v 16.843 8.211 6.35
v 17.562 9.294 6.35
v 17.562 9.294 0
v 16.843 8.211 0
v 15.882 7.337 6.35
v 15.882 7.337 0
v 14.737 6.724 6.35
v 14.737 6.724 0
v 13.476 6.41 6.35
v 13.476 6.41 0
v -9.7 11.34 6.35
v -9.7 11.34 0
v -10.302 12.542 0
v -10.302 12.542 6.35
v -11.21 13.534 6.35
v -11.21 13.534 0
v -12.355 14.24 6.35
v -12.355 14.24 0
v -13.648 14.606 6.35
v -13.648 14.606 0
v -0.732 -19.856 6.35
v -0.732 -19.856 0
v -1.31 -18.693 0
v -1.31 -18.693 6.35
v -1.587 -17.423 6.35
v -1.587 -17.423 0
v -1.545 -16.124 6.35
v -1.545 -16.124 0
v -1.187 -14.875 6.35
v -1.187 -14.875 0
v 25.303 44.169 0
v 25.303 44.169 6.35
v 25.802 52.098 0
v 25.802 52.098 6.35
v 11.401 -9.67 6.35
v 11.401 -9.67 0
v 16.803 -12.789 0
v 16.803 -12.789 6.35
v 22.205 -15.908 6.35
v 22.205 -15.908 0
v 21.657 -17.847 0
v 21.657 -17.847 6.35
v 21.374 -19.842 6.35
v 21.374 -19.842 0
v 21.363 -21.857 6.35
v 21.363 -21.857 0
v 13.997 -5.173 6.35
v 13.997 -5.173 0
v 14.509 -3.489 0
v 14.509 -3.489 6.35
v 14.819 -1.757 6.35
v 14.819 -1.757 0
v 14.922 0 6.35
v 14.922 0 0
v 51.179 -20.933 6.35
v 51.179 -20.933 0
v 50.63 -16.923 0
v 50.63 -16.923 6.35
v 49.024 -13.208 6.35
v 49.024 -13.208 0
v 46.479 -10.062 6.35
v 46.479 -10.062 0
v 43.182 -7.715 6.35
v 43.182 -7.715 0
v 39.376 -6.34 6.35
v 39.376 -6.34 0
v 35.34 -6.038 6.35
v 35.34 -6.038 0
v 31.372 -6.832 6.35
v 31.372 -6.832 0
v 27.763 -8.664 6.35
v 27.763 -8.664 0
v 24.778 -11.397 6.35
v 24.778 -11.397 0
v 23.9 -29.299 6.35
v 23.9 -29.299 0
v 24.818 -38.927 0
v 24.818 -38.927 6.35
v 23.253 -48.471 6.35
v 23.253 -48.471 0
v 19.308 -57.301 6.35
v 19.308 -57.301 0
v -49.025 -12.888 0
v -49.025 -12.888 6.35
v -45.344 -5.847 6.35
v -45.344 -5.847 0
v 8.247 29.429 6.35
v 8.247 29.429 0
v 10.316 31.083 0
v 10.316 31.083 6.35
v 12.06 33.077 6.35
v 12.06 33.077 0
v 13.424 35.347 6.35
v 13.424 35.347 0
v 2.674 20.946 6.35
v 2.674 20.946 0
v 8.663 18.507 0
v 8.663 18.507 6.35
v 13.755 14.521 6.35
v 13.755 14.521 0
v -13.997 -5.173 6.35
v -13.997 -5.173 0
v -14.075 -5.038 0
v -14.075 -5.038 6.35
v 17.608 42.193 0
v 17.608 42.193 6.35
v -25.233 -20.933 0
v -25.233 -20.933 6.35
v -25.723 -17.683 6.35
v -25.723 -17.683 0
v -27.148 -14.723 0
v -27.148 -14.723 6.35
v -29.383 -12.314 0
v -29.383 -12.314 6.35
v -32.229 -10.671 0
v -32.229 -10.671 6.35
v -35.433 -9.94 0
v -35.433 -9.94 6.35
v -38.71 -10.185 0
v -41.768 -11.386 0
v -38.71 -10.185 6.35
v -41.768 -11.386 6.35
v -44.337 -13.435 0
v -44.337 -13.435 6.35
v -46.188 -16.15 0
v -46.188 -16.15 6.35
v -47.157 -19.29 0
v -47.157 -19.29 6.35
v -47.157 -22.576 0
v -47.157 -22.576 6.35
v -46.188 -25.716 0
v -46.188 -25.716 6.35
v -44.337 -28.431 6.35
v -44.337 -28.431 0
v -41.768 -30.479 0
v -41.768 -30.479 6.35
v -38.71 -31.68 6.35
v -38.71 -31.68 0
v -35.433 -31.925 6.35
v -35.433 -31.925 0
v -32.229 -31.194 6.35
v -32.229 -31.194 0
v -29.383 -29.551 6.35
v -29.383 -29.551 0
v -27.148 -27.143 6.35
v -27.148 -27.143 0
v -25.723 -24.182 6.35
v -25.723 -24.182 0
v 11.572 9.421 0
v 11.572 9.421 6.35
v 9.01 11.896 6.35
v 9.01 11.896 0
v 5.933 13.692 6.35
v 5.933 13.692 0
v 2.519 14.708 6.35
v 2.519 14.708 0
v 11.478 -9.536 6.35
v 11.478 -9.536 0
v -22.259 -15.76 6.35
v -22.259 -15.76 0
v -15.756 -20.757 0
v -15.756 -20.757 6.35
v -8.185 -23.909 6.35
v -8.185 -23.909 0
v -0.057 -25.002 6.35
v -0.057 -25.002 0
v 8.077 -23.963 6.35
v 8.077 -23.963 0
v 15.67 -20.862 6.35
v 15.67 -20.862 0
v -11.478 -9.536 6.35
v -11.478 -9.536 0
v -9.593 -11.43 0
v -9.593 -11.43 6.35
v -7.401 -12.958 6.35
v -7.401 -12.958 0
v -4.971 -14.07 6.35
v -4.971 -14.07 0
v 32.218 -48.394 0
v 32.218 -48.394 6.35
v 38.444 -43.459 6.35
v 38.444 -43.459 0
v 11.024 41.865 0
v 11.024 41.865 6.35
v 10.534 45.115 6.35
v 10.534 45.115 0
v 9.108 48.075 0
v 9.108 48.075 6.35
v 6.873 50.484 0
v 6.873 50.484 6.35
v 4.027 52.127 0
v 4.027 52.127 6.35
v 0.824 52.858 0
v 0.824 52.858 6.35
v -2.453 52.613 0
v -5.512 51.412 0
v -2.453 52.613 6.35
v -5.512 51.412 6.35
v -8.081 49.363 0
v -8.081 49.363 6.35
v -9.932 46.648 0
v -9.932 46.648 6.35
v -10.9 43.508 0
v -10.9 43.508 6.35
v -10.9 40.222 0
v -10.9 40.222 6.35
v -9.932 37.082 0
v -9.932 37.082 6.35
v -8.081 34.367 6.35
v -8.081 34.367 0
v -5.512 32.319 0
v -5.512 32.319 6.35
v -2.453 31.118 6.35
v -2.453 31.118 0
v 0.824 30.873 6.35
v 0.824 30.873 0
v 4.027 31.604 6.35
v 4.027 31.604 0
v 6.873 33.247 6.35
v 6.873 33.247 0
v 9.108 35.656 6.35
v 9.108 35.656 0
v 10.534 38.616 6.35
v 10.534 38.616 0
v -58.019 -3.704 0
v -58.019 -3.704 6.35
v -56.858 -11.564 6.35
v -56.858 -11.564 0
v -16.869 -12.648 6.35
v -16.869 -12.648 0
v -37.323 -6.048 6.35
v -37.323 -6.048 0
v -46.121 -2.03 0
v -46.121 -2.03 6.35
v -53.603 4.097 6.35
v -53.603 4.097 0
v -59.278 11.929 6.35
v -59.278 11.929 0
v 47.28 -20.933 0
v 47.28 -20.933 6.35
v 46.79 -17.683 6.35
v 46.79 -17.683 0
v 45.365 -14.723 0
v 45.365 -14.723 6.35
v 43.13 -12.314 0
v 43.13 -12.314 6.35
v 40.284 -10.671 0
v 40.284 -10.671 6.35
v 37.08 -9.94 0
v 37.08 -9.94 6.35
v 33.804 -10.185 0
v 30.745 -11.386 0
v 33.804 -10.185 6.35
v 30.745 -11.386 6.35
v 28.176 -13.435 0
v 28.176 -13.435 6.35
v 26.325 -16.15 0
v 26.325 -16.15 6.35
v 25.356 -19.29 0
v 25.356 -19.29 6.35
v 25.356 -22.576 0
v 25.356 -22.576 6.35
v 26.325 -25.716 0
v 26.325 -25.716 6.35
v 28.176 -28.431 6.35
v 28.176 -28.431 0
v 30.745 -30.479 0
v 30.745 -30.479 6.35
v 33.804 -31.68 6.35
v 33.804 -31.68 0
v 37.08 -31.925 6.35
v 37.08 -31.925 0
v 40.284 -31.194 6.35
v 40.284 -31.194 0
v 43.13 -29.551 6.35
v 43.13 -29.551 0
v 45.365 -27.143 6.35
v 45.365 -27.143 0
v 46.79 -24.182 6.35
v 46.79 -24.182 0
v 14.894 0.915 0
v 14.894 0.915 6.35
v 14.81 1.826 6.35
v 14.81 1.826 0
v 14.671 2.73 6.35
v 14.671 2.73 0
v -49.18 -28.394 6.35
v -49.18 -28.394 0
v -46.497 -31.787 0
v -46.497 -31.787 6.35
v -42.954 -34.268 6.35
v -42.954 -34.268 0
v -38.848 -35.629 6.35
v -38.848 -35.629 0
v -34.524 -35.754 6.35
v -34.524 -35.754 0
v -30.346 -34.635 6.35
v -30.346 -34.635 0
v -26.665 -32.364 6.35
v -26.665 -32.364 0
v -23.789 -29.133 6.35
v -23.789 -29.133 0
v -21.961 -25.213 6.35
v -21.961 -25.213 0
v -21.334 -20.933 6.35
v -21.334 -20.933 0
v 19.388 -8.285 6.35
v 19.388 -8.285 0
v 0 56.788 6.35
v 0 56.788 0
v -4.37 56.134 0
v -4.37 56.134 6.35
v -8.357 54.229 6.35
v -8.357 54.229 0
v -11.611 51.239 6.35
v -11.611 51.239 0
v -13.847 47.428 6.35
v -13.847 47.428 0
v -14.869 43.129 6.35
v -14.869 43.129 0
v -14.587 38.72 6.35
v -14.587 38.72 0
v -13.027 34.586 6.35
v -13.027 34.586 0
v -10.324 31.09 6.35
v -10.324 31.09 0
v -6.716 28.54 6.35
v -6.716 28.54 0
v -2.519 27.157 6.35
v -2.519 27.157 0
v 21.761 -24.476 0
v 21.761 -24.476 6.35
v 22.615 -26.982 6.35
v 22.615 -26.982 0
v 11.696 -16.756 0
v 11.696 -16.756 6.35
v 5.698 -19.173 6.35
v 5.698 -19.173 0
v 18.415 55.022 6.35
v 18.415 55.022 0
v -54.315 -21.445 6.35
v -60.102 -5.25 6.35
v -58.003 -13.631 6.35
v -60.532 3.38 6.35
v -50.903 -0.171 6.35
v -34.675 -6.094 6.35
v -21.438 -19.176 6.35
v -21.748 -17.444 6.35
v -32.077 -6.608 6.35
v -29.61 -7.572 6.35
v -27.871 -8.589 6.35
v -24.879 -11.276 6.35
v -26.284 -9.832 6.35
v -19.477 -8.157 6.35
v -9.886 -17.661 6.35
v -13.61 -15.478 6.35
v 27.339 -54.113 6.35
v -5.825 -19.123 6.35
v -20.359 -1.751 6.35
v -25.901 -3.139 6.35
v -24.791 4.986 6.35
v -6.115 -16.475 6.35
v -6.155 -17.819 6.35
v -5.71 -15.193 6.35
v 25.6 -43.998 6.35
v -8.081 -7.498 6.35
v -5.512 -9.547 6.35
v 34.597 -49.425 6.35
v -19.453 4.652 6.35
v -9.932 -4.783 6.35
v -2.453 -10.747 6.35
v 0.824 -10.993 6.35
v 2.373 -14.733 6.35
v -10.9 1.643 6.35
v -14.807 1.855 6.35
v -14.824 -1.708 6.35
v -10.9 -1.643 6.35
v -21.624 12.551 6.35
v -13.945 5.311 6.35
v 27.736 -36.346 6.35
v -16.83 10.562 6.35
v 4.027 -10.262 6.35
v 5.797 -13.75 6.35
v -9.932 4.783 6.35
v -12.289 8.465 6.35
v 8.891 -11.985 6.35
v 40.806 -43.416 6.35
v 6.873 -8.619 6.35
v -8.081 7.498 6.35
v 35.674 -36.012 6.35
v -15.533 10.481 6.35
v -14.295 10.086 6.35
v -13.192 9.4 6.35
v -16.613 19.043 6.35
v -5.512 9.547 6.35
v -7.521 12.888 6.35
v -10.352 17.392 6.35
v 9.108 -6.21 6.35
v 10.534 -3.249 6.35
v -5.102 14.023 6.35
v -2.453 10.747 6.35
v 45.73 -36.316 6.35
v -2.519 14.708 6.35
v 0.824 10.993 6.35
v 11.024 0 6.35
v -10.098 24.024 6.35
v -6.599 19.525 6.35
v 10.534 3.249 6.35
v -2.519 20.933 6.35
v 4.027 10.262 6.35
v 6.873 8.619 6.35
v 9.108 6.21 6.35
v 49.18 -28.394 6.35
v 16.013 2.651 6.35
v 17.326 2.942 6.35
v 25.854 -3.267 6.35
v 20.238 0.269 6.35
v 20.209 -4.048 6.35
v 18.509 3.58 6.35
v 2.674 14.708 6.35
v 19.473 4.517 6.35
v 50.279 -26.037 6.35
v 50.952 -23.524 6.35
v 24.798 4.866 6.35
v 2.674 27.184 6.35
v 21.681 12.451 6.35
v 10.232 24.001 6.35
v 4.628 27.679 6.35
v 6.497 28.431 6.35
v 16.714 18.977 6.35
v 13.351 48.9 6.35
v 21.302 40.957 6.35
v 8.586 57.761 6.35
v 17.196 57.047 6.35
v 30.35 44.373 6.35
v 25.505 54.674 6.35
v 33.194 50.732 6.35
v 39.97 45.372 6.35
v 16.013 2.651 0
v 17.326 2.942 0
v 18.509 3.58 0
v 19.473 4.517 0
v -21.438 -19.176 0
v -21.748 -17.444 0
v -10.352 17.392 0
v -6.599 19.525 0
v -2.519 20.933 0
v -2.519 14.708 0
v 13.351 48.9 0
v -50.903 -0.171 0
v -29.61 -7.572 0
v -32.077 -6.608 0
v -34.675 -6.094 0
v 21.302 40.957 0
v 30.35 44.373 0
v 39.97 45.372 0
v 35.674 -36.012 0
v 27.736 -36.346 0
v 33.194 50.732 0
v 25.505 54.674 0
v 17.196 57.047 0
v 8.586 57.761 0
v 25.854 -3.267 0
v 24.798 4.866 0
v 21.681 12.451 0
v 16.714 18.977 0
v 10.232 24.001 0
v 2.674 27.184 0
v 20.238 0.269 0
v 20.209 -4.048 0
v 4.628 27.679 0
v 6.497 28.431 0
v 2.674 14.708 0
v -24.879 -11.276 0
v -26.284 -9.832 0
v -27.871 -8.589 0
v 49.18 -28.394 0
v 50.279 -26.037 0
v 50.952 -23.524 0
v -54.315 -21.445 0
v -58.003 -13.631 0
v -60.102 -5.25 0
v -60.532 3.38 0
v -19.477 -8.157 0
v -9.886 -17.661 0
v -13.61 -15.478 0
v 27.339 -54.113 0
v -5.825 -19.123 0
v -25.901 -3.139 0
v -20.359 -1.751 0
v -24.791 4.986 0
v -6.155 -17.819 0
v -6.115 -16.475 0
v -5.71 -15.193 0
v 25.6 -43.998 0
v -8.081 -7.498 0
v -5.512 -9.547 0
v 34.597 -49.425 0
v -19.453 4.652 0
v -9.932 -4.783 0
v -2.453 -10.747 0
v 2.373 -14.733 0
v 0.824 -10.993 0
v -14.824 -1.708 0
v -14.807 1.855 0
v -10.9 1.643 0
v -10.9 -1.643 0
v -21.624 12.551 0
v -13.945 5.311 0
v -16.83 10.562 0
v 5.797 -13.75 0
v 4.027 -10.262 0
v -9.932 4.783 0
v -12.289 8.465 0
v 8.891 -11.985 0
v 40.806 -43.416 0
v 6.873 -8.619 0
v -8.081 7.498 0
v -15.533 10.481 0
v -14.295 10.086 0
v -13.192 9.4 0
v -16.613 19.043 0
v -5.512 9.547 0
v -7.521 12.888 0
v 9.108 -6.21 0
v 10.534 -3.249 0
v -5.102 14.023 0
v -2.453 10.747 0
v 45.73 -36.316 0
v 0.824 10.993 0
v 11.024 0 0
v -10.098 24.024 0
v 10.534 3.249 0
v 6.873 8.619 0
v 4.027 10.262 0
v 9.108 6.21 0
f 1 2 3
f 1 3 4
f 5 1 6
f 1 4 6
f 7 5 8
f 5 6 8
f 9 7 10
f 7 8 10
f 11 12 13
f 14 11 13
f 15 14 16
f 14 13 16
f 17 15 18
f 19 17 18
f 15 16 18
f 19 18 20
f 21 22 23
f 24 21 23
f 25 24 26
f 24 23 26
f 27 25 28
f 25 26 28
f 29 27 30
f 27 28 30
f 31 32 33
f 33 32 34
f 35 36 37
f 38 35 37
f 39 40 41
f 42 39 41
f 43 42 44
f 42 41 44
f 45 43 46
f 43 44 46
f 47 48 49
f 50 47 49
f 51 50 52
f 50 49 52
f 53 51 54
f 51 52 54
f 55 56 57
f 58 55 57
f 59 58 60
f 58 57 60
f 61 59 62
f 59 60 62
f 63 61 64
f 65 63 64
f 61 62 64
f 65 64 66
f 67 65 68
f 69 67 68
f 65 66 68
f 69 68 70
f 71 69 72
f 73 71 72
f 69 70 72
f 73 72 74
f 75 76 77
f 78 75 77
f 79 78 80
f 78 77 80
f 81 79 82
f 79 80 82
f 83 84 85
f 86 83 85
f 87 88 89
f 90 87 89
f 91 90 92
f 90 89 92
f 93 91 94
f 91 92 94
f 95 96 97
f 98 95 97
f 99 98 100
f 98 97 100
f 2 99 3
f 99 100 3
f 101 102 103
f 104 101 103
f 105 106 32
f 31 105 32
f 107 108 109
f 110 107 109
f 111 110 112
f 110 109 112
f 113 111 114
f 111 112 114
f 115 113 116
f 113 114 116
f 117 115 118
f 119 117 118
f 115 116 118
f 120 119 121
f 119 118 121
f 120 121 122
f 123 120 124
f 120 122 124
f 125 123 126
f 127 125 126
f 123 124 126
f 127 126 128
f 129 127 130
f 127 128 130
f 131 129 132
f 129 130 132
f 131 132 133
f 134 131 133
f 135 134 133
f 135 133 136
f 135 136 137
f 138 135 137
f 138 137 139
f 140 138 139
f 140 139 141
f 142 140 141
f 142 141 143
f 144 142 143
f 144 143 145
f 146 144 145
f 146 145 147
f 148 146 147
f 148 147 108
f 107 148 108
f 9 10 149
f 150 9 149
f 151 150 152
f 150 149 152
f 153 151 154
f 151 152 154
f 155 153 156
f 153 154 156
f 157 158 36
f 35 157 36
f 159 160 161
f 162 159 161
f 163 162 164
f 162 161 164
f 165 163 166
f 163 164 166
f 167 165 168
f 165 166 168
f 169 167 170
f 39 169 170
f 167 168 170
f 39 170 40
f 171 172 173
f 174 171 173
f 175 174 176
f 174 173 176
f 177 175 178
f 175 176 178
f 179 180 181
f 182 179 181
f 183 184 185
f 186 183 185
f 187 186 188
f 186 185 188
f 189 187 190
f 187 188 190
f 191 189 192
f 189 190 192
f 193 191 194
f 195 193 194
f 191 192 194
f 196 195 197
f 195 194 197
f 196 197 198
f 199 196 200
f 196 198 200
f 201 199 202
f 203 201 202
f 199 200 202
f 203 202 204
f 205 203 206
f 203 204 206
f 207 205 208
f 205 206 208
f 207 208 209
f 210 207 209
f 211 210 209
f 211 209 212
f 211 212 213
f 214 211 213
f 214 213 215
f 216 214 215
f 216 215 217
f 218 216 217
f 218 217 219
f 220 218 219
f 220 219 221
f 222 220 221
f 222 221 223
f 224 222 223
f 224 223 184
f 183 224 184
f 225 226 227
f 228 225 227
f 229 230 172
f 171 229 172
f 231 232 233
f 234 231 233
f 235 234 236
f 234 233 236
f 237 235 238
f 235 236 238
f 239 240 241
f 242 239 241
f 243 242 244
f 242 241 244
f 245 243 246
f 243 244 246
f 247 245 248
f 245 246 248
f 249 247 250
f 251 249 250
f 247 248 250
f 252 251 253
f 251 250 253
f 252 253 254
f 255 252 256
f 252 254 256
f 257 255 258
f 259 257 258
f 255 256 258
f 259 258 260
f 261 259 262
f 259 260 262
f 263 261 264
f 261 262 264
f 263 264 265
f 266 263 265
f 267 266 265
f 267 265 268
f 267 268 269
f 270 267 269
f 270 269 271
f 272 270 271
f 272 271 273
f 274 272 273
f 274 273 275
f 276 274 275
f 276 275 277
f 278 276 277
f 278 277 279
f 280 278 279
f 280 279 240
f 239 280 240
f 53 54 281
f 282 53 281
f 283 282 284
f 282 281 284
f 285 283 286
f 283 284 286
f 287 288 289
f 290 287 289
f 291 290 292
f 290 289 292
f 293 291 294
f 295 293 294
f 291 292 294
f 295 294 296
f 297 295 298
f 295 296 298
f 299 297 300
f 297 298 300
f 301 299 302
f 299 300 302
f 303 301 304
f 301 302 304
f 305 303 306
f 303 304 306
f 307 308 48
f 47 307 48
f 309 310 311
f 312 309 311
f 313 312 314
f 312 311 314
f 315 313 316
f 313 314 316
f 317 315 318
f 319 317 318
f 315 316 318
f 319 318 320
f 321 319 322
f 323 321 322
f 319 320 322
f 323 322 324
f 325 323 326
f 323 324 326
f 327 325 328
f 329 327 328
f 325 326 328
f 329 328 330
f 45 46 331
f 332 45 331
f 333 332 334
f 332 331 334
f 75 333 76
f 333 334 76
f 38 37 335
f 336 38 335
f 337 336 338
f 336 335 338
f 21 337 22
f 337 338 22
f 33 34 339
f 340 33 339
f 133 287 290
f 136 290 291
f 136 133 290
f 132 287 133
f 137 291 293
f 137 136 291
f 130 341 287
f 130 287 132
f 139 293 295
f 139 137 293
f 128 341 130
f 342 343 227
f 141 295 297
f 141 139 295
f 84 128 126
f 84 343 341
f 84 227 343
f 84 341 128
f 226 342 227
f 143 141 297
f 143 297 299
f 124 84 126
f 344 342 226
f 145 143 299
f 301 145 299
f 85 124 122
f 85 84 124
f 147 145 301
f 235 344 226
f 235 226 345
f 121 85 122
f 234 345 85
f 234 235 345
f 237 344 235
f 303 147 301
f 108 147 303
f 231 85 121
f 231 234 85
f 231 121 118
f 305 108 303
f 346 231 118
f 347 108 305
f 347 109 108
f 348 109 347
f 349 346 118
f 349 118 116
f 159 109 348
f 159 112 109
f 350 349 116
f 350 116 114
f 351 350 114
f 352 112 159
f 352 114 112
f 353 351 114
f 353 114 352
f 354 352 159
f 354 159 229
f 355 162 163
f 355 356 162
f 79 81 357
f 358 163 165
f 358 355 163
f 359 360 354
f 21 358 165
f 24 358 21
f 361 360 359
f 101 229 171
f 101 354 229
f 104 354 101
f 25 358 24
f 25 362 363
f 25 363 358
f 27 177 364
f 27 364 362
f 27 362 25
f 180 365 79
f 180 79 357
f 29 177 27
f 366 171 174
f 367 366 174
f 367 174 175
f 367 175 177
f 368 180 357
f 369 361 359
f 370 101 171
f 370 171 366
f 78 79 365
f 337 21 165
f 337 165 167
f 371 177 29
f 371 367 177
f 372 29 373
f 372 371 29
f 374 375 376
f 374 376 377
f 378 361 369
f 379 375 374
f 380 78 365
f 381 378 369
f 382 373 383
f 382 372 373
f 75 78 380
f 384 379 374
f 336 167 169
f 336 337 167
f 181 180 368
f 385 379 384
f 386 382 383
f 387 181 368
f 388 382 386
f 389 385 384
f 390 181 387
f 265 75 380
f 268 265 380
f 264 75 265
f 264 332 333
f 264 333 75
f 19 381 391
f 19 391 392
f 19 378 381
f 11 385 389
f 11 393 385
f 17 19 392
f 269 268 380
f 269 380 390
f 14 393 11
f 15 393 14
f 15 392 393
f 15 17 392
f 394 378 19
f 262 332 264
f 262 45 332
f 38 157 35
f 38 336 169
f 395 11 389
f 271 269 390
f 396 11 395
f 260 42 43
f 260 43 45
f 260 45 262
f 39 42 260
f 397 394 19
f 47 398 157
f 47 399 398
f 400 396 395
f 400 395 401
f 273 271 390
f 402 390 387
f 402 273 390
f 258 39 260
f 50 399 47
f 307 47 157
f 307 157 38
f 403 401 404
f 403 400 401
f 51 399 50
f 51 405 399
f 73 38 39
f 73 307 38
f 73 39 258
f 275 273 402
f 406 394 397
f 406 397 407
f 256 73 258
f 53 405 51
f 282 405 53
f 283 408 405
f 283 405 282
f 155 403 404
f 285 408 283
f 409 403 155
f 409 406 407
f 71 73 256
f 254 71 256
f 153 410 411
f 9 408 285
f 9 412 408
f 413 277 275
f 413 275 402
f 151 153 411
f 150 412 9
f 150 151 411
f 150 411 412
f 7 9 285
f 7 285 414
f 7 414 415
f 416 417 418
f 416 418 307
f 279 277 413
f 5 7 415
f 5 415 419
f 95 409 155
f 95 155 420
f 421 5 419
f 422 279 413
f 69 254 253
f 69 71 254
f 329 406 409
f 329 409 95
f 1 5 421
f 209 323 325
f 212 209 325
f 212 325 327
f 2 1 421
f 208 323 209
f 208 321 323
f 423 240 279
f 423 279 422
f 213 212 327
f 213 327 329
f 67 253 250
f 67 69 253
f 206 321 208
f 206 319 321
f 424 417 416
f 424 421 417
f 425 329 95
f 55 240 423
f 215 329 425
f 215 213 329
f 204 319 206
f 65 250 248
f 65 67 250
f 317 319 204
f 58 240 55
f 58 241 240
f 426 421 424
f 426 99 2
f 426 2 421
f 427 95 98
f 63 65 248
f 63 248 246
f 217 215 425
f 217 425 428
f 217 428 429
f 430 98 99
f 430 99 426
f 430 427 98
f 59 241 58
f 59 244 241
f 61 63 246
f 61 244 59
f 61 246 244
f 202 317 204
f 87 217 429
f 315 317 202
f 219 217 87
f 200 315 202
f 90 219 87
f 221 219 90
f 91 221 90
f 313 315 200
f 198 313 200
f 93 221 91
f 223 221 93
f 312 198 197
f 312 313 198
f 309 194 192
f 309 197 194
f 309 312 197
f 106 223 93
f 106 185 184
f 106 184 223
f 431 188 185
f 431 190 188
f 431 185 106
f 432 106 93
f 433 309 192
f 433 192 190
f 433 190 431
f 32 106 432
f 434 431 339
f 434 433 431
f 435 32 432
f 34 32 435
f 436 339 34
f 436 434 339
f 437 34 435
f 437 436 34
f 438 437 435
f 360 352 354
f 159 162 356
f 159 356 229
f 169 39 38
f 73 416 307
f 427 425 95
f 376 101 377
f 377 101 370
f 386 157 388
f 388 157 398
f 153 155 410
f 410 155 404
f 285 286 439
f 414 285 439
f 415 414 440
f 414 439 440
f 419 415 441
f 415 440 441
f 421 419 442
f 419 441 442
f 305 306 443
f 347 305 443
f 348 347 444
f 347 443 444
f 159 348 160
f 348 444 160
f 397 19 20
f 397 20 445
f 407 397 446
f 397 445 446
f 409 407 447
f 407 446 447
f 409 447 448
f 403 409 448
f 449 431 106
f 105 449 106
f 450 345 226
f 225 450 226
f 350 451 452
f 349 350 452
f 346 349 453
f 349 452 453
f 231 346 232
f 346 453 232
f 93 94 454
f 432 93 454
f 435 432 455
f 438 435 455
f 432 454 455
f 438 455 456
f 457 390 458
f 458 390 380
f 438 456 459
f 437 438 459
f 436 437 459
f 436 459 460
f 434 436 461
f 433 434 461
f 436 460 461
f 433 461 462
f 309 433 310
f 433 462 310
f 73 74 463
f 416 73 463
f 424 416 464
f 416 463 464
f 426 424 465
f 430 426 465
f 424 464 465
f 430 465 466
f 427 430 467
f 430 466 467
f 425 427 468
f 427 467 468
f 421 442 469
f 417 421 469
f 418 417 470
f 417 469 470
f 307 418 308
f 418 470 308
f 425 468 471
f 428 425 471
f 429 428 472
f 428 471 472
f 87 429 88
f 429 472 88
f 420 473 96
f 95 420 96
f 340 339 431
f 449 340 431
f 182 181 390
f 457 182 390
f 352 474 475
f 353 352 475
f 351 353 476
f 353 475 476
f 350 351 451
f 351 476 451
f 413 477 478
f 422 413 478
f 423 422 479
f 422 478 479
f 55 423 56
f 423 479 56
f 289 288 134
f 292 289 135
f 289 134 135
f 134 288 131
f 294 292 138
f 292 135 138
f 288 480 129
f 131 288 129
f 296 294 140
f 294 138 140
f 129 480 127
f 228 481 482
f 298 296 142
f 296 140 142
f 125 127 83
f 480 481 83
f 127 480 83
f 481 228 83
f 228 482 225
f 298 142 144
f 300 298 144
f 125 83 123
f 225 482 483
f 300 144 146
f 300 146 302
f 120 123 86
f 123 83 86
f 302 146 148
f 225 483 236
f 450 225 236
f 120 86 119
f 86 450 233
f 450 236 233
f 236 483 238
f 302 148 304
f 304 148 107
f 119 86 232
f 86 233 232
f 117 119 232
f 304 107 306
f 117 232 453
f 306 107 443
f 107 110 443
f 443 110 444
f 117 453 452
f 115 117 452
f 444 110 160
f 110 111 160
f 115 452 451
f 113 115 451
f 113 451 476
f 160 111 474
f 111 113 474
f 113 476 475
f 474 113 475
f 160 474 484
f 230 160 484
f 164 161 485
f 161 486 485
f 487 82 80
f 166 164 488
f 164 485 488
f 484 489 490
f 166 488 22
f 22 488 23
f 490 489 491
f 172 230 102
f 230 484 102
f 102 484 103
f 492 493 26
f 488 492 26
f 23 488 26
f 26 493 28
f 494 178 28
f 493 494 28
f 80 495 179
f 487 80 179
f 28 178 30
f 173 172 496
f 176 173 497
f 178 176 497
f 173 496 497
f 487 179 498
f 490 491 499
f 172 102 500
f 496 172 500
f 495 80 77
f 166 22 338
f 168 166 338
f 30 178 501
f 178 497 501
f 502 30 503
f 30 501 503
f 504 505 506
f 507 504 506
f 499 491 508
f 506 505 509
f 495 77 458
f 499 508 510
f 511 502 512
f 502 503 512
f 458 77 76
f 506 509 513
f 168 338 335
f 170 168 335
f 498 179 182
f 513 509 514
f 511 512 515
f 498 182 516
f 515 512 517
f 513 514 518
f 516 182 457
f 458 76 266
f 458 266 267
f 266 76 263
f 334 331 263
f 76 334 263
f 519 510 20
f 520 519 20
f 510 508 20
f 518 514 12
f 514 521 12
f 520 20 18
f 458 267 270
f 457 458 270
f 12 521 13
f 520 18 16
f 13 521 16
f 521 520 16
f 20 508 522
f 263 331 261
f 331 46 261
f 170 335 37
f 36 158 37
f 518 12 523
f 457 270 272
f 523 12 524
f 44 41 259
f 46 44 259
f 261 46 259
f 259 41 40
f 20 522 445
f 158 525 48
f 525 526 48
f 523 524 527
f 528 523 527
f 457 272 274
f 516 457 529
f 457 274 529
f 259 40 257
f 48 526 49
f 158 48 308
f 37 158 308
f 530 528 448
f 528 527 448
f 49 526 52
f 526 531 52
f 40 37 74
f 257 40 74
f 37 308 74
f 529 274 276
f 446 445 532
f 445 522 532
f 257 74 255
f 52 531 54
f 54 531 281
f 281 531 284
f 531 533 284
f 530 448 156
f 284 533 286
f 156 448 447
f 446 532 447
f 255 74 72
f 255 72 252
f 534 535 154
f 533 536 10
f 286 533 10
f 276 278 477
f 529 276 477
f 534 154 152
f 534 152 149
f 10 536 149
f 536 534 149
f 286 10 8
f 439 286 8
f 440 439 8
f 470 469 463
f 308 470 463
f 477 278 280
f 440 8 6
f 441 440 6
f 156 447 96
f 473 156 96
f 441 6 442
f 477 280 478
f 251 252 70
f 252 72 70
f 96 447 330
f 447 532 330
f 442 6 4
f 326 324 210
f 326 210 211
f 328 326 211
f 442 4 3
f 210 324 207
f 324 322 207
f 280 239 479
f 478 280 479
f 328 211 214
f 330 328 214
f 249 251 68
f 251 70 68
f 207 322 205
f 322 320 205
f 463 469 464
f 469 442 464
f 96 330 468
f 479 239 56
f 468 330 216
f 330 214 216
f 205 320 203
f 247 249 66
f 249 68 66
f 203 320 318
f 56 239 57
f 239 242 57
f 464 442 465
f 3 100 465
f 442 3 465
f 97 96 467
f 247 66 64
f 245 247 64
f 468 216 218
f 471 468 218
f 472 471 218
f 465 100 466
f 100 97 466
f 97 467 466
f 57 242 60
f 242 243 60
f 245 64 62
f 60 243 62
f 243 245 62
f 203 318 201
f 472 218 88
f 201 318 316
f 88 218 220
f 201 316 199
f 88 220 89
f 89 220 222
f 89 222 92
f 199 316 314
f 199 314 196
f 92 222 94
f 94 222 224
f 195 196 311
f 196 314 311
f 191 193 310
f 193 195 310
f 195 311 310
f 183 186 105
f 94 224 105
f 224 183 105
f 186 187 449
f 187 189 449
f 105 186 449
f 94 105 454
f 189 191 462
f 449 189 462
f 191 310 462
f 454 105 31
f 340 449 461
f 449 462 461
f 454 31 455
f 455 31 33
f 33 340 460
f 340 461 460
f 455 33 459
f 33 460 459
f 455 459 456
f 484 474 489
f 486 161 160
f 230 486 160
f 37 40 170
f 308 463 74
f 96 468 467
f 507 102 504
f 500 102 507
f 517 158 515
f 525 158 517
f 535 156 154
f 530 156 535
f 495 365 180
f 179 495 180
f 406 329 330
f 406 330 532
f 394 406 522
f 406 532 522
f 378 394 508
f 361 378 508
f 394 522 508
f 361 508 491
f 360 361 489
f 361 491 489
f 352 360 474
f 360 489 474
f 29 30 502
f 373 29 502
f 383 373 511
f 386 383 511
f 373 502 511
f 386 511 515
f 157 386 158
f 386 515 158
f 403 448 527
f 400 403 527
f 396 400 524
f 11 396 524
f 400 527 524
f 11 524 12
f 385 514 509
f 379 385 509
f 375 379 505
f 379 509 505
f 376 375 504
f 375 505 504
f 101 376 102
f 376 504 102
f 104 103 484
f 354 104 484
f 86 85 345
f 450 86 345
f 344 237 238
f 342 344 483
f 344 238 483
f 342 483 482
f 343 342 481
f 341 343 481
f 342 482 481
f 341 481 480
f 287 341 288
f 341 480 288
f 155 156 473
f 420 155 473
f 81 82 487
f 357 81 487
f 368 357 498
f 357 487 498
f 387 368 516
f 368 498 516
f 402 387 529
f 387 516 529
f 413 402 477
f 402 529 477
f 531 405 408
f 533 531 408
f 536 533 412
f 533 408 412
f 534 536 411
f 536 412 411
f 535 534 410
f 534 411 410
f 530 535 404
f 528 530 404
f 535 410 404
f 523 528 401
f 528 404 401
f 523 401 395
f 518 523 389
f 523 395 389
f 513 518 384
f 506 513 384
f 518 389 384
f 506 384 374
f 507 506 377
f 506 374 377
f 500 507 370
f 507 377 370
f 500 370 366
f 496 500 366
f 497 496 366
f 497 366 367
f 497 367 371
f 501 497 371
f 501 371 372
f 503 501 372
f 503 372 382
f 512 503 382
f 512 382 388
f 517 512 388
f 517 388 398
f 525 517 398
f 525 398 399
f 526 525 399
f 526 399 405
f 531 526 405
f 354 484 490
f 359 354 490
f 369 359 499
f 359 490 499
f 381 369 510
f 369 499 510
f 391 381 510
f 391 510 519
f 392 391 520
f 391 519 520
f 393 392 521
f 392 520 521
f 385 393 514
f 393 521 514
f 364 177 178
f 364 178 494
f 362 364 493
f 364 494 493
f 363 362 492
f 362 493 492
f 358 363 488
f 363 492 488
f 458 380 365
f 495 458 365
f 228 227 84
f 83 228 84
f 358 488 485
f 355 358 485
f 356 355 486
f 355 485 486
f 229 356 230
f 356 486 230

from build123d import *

# Parameters (mm, degrees)
F1_DEPTH  = 6.35
F2_R      = 11.0236
F3_DEPTH  = 25.4
F4_R      = 11.0236
F5_DEPTH  = 25.4
F7_DEPTH  = 6.35
F9_DEPTH  = 6.35
F11_DEPTH = 25.4


with BuildPart() as f1:
    # F0 (on Top) → F1 (new body)
    with BuildSketch(Plane.XY):
        with BuildLine():
            ThreePointArc((39.9699173868, 45.3715771437), (21.4086371945, 56.0642096985), (0, 56.787927047))
            ThreePointArc((0, 56.787927047), (10.5518009423, 52.4172279893), (14.9225, 41.865427047))
            ThreePointArc((14.9225, 41.865427047), (14.5429525108, 38.5212472494), (13.4236173036, 35.3471830552))
            ThreePointArc((13.4236173036, 35.3471830552), (25.7159889241, 42.956648129), (39.9699173868, 45.3715771437))
        make_face()
        with BuildLine():
            Line((11.4783198204, -9.5356793335), (13.9973004553, -5.1726768904))
            ThreePointArc((13.9973004553, -5.1726768904), (14.6893791954, -2.6273836992), (14.9225, 0))
            ThreePointArc((14.9225, 0), (11.4076836995, 9.6200706267), (2.518980635, 14.7083562239))
            Line((2.518980635, 14.7083562239), (-2.518980635, 14.7083562239))
            ThreePointArc((-2.518980635, 14.7083562239), (-12.923264088, 7.46125), (-13.9973004553, -5.1726768904))
            Line((-13.9973004553, -5.1726768904), (-11.4783198204, -9.5356793335))
            ThreePointArc((-11.4783198204, -9.5356793335), (0, -14.9225), (11.4783198204, -9.5356793335))
        make_face()
        with BuildLine():
            ThreePointArc((-59.2778971096, 11.9291752723), (-59.2573484392, -9.4916811784), (-49.179787451, -28.3939635235))
            ThreePointArc((-49.179787451, -28.3939635235), (-49.4383993618, -13.9384908074), (-37.3233671298, -6.048397932))
            ThreePointArc((-37.3233671298, -6.048397932), (-50.0595430032, 0.7923756272), (-59.2778971096, 11.9291752723))
        make_face()
        with BuildLine():
            Line((24.7782035426, -11.39703419), (13.9973004553, -5.1726768904))
            ThreePointArc((13.9973004553, -5.1726768904), (12.923264088, -7.46125), (11.4783198204, -9.5356793335))
            Line((11.4783198204, -9.5356793335), (11.4007932052, -9.6699593699))
            Line((11.4007932052, -9.6699593699), (22.205423221, -15.9080154181))
            ThreePointArc((22.205423221, -15.9080154181), (23.2940753375, -13.5397474451), (24.7782035426, -11.39703419))
        make_face()
        with BuildLine():
            ThreePointArc((-2.518980635, 14.7083562239), (0, 14.9225), (2.518980635, 14.7083562239))
            Line((2.518980635, 14.7083562239), (2.6740338653, 14.7083562239))
            Line((2.6740338653, 14.7083562239), (2.6740338653, 27.1844683202))
            ThreePointArc((2.6740338653, 27.1844683202), (0.0787275795, 26.9431347225), (-2.518980635, 27.1570708231))
            Line((-2.518980635, 27.1570708231), (-2.518980635, 14.7083562239))
        make_face()
        with BuildLine():
            Line((-22.2592229077, -15.7600366331), (-11.4783198204, -9.5356793335))
            ThreePointArc((-11.4783198204, -9.5356793335), (-12.923264088, -7.46125), (-13.9973004553, -5.1726768904))
            Line((-13.9973004553, -5.1726768904), (-14.0748270705, -5.038396854))
            Line((-14.0748270705, -5.038396854), (-24.8794570864, -11.2764529022))
            ThreePointArc((-24.8794570864, -11.2764529022), (-23.372802917, -13.4033872774), (-22.2592229077, -15.7600366331))
        make_face()
        with BuildLine():
            ThreePointArc((0, 56.787927047), (-14.8688676772, 43.1294603729), (-2.518980635, 27.1570708231))
            Line((-2.518980635, 27.1570708231), (-2.518980635, 27.4083562239))
            Line((-2.518980635, 27.4083562239), (2.6740338653, 27.4083562239))
            Line((2.6740338653, 27.4083562239), (2.6740338653, 27.1844683202))
            ThreePointArc((2.6740338653, 27.1844683202), (5.574874939, 28.0233977281), (8.2474275307, 29.429151665))
            ThreePointArc((8.2474275307, 29.429151665), (10.6805834625, 32.5236842879), (13.4236173036, 35.3471830552))
            ThreePointArc((13.4236173036, 35.3471830552), (14.5429525108, 38.5212472494), (14.9225, 41.865427047))
            ThreePointArc((14.9225, 41.865427047), (10.5518009423, 52.4172279893), (0, 56.787927047))
        make_face()
        with BuildLine():
            ThreePointArc((19.3079797228, -57.3007524159), (37.8487112447, -46.5725285201), (49.179787451, -28.3939635235))
            ThreePointArc((49.179787451, -28.3939635235), (36.7902868106, -35.845664366), (23.8997498262, -29.2987851232))
            ThreePointArc((23.8997498262, -29.2987851232), (24.3435540791, -43.7490237562), (19.3079797228, -57.3007524159))
        make_face()
        with BuildLine():
            ThreePointArc((-21.334023363, -20.9327135235), (-21.5671441676, -18.3053298244), (-22.2592229077, -15.7600366331))
            Line((-22.2592229077, -15.7600366331), (-22.4768424484, -15.8856793335))
            Line((-22.4768424484, -15.8856793335), (-25.0733496986, -11.388396854))
            Line((-25.0733496986, -11.388396854), (-24.8794570864, -11.2764529022))
            ThreePointArc((-24.8794570864, -11.2764529022), (-27.0564118024, -9.183715544), (-29.6101067191, -7.5720940751))
            ThreePointArc((-29.6101067191, -7.5720940751), (-33.5066285492, -7.0121855382), (-37.3233671298, -6.048397932))
            ThreePointArc((-37.3233671298, -6.048397932), (-49.4383993618, -13.9384908074), (-49.179787451, -28.3939635235))
            ThreePointArc((-49.179787451, -28.3939635235), (-32.3942961625, -35.3467416663), (-21.334023363, -20.9327135235))
        make_face()
        with BuildLine():
            ThreePointArc((51.179023363, -20.9327135235), (41.3258319318, -6.8976461249), (24.7782035426, -11.39703419))
            Line((24.7782035426, -11.39703419), (24.9958230834, -11.5226768904))
            Line((24.9958230834, -11.5226768904), (22.3993158332, -16.0199593699))
            Line((22.3993158332, -16.0199593699), (22.205423221, -15.9080154181))
            ThreePointArc((22.205423221, -15.9080154181), (21.4815368634, -18.8396821842), (21.3626791884, -21.8570575899))
            ThreePointArc((21.3626791884, -21.8570575899), (22.8260450868, -25.5114987497), (23.8997498262, -29.2987851232))
            ThreePointArc((23.8997498262, -29.2987851232), (36.7902868106, -35.845664366), (49.179787451, -28.3939635235))
            ThreePointArc((49.179787451, -28.3939635235), (50.6705515058, -24.794940724), (51.179023363, -20.9327135235))
        make_face()
        with BuildLine():
            ThreePointArc((13.4236173036, 35.3471830552), (10.6805834625, 32.5236842879), (8.2474275307, 29.429151665))
            ThreePointArc((8.2474275307, 29.429151665), (11.2322891672, 32.0411364205), (13.4236173036, 35.3471830552))
        make_face()
        with BuildLine():
            ThreePointArc((-37.3233671298, -6.048397932), (-33.5066285492, -7.0121855382), (-29.6101067191, -7.5720940751))
            ThreePointArc((-29.6101067191, -7.5720940751), (-33.3645826899, -6.2931204488), (-37.3233671298, -6.048397932))
        make_face()
        with BuildLine():
            ThreePointArc((23.8997498262, -29.2987851232), (22.8260450868, -25.5114987497), (21.3626791884, -21.8570575899))
            ThreePointArc((21.3626791884, -21.8570575899), (22.1322935227, -25.7480159717), (23.8997498262, -29.2987851232))
        make_face()
        with BuildLine():
            Line((24.9958230834, -11.5226768904), (24.7782035426, -11.39703419))
            ThreePointArc((24.7782035426, -11.39703419), (23.2940753375, -13.5397474451), (22.205423221, -15.9080154181))
            Line((22.205423221, -15.9080154181), (22.3993158332, -16.0199593699))
            Line((22.3993158332, -16.0199593699), (24.9958230834, -11.5226768904))
        make_face()
        with BuildLine():
            Line((-22.4768424484, -15.8856793335), (-22.2592229077, -15.7600366331))
            ThreePointArc((-22.2592229077, -15.7600366331), (-23.372802917, -13.4033872774), (-24.8794570864, -11.2764529022))
            Line((-24.8794570864, -11.2764529022), (-25.0733496986, -11.388396854))
            Line((-25.0733496986, -11.388396854), (-22.4768424484, -15.8856793335))
        make_face()
        with BuildLine():
            Line((-2.518980635, 14.7083562239), (2.518980635, 14.7083562239))
            ThreePointArc((2.518980635, 14.7083562239), (0, 14.9225), (-2.518980635, 14.7083562239))
        make_face()
        with BuildLine():
            ThreePointArc((-13.9973004553, -5.1726768904), (-12.923264088, -7.46125), (-11.4783198204, -9.5356793335))
            Line((-11.4783198204, -9.5356793335), (-13.9973004553, -5.1726768904))
        make_face()
        with BuildLine():
            Line((-2.518980635, 27.4083562239), (-2.518980635, 27.1570708231))
            ThreePointArc((-2.518980635, 27.1570708231), (0.0787275795, 26.9431347225), (2.6740338653, 27.1844683202))
            Line((2.6740338653, 27.1844683202), (2.6740338653, 27.4083562239))
            Line((2.6740338653, 27.4083562239), (-2.518980635, 27.4083562239))
        make_face()
        with BuildLine():
            ThreePointArc((11.4783198204, -9.5356793335), (12.923264088, -7.46125), (13.9973004553, -5.1726768904))
            Line((13.9973004553, -5.1726768904), (11.4783198204, -9.5356793335))
        make_face()
    extrude(amount=F1_DEPTH)

    # F2 (on face) → F3 (cut)
    with BuildSketch(Plane.XY.offset(6.35)):
        with Locations((0, 41.865427047)):
            Circle(F2_R)
        with Locations((36.256523363, -20.9327135235)):
            Circle(F2_R)
        with Locations((-36.256523363, -20.9327135235)):
            Circle(F2_R)
    extrude(amount=-F3_DEPTH, mode=Mode.SUBTRACT)

    # F4 (on face) → F5 (cut)
    with BuildSketch(Plane.XY.offset(6.35)):
        Circle(F4_R)
    extrude(amount=-F5_DEPTH, mode=Mode.SUBTRACT)

    # F6 (on Top) → F7 (join)
    with BuildSketch(Plane.XY):
        with BuildLine():
            Line((-2.518980635, 20.9327135235), (-2.518980635, 27.1570708231))
            ThreePointArc((-2.518980635, 27.1570708231), (-21.6236198706, 12.5506950245), (-24.8794570864, -11.2764529022))
            Line((-24.8794570864, -11.2764529022), (-19.4771420784, -8.1574248781))
            ThreePointArc((-19.4771420784, -8.1574248781), (-17.1752258506, 9.9886362226), (-2.518980635, 20.9327135235))
        make_face()
        with BuildLine():
            ThreePointArc((2.6740338653, 20.9464122721), (17.2380256432, 9.8798637911), (19.387751999, -8.2848555402))
            Line((19.387751999, -8.2848555402), (24.7782035426, -11.39703419))
            ThreePointArc((24.7782035426, -11.39703419), (21.6810306616, 12.4512566175), (2.6740338653, 27.1844683202))
            Line((2.6740338653, 27.1844683202), (2.6740338653, 20.9464122721))
        make_face()
        with BuildLine():
            ThreePointArc((16.8031082131, -12.788987394), (-0.0627997926, -19.8685000137), (-16.868771364, -12.6478579833))
            Line((-16.868771364, -12.6478579833), (-22.2592229077, -15.7600366331))
            ThreePointArc((-22.2592229077, -15.7600366331), (-0.057410791, -25.0019516419), (22.205423221, -15.9080154181))
            Line((22.205423221, -15.9080154181), (16.8031082131, -12.788987394))
        make_face()
    extrude(amount=F7_DEPTH)

    # F8 (on Top) → F9 (join)
    with BuildSketch(Plane.XY):
        with BuildLine():
            Line((-11.469233202, 6.8651486084), (-9.5382659064, 10.7402523643))
            ThreePointArc((-9.5382659064, 10.7402523643), (-11.469233202, 13.7334678675), (-14.9203554134, 14.6153574454))
            Line((-14.9203554134, 14.6153574454), (-18.1496096475, 10.3096855748))
            ThreePointArc((-18.1496096475, 10.3096855748), (-14.0887724556, 9.9850523749), (-11.469233202, 6.8651486084))
        make_face()
        with BuildLine():
            Line((11.6800096966, 6.5000730107), (14.0704643438, 2.8902544008))
            ThreePointArc((14.0704643438, 2.8902544008), (17.6281486563, 3.0659133811), (20.1174485398, 5.6137280988))
            Line((20.1174485398, 5.6137280988), (18.0032544366, 10.5631802361))
            ThreePointArc((18.0032544366, 10.5631802361), (15.6916952426, 7.2087086672), (11.6800096966, 6.5000730107))
        make_face()
        with BuildLine():
            Line((-0.2107764946, -13.3652216191), (-4.5321984374, -13.6305067652))
            ThreePointArc((-4.5321984374, -13.6305067652), (-6.1589154543, -16.7993812486), (-5.1970931264, -20.2290855441))
            Line((-5.1970931264, -20.2290855441), (0.146355211, -20.8728658109))
            ThreePointArc((0.146355211, -20.8728658109), (-1.602922787, -17.1937610422), (-0.2107764946, -13.3652216191))
        make_face()
    extrude(amount=F9_DEPTH)

    # F10 (on face) → F11 (cut)
    with BuildSketch(Plane.XY.offset(6.35)):
        Polygon((-45.3443394157, -5.8470536995), (-50.9034361544, -0.1712185392), (-58.0193315347, -3.7043041955), (-56.8581000013, -11.5637063766), (-49.0245240646, -12.8879983994), align=None)
        Polygon((27.7358667489, -36.3458230021), (25.5999976818, -43.9980595801), (32.217687304, -48.3940629219), (38.4435134847, -43.4587058238), (35.6735960501, -36.0124840487), align=None)
        Polygon((13.3509280145, 48.9004824481), (17.6084726668, 42.1928767016), (25.3034384727, 44.1692781193), (25.8016442307, 52.0983671174), (18.4145865166, 55.0224122004), align=None)
    extrude(amount=-F11_DEPTH, mode=Mode.SUBTRACT)


solid = f1.part
